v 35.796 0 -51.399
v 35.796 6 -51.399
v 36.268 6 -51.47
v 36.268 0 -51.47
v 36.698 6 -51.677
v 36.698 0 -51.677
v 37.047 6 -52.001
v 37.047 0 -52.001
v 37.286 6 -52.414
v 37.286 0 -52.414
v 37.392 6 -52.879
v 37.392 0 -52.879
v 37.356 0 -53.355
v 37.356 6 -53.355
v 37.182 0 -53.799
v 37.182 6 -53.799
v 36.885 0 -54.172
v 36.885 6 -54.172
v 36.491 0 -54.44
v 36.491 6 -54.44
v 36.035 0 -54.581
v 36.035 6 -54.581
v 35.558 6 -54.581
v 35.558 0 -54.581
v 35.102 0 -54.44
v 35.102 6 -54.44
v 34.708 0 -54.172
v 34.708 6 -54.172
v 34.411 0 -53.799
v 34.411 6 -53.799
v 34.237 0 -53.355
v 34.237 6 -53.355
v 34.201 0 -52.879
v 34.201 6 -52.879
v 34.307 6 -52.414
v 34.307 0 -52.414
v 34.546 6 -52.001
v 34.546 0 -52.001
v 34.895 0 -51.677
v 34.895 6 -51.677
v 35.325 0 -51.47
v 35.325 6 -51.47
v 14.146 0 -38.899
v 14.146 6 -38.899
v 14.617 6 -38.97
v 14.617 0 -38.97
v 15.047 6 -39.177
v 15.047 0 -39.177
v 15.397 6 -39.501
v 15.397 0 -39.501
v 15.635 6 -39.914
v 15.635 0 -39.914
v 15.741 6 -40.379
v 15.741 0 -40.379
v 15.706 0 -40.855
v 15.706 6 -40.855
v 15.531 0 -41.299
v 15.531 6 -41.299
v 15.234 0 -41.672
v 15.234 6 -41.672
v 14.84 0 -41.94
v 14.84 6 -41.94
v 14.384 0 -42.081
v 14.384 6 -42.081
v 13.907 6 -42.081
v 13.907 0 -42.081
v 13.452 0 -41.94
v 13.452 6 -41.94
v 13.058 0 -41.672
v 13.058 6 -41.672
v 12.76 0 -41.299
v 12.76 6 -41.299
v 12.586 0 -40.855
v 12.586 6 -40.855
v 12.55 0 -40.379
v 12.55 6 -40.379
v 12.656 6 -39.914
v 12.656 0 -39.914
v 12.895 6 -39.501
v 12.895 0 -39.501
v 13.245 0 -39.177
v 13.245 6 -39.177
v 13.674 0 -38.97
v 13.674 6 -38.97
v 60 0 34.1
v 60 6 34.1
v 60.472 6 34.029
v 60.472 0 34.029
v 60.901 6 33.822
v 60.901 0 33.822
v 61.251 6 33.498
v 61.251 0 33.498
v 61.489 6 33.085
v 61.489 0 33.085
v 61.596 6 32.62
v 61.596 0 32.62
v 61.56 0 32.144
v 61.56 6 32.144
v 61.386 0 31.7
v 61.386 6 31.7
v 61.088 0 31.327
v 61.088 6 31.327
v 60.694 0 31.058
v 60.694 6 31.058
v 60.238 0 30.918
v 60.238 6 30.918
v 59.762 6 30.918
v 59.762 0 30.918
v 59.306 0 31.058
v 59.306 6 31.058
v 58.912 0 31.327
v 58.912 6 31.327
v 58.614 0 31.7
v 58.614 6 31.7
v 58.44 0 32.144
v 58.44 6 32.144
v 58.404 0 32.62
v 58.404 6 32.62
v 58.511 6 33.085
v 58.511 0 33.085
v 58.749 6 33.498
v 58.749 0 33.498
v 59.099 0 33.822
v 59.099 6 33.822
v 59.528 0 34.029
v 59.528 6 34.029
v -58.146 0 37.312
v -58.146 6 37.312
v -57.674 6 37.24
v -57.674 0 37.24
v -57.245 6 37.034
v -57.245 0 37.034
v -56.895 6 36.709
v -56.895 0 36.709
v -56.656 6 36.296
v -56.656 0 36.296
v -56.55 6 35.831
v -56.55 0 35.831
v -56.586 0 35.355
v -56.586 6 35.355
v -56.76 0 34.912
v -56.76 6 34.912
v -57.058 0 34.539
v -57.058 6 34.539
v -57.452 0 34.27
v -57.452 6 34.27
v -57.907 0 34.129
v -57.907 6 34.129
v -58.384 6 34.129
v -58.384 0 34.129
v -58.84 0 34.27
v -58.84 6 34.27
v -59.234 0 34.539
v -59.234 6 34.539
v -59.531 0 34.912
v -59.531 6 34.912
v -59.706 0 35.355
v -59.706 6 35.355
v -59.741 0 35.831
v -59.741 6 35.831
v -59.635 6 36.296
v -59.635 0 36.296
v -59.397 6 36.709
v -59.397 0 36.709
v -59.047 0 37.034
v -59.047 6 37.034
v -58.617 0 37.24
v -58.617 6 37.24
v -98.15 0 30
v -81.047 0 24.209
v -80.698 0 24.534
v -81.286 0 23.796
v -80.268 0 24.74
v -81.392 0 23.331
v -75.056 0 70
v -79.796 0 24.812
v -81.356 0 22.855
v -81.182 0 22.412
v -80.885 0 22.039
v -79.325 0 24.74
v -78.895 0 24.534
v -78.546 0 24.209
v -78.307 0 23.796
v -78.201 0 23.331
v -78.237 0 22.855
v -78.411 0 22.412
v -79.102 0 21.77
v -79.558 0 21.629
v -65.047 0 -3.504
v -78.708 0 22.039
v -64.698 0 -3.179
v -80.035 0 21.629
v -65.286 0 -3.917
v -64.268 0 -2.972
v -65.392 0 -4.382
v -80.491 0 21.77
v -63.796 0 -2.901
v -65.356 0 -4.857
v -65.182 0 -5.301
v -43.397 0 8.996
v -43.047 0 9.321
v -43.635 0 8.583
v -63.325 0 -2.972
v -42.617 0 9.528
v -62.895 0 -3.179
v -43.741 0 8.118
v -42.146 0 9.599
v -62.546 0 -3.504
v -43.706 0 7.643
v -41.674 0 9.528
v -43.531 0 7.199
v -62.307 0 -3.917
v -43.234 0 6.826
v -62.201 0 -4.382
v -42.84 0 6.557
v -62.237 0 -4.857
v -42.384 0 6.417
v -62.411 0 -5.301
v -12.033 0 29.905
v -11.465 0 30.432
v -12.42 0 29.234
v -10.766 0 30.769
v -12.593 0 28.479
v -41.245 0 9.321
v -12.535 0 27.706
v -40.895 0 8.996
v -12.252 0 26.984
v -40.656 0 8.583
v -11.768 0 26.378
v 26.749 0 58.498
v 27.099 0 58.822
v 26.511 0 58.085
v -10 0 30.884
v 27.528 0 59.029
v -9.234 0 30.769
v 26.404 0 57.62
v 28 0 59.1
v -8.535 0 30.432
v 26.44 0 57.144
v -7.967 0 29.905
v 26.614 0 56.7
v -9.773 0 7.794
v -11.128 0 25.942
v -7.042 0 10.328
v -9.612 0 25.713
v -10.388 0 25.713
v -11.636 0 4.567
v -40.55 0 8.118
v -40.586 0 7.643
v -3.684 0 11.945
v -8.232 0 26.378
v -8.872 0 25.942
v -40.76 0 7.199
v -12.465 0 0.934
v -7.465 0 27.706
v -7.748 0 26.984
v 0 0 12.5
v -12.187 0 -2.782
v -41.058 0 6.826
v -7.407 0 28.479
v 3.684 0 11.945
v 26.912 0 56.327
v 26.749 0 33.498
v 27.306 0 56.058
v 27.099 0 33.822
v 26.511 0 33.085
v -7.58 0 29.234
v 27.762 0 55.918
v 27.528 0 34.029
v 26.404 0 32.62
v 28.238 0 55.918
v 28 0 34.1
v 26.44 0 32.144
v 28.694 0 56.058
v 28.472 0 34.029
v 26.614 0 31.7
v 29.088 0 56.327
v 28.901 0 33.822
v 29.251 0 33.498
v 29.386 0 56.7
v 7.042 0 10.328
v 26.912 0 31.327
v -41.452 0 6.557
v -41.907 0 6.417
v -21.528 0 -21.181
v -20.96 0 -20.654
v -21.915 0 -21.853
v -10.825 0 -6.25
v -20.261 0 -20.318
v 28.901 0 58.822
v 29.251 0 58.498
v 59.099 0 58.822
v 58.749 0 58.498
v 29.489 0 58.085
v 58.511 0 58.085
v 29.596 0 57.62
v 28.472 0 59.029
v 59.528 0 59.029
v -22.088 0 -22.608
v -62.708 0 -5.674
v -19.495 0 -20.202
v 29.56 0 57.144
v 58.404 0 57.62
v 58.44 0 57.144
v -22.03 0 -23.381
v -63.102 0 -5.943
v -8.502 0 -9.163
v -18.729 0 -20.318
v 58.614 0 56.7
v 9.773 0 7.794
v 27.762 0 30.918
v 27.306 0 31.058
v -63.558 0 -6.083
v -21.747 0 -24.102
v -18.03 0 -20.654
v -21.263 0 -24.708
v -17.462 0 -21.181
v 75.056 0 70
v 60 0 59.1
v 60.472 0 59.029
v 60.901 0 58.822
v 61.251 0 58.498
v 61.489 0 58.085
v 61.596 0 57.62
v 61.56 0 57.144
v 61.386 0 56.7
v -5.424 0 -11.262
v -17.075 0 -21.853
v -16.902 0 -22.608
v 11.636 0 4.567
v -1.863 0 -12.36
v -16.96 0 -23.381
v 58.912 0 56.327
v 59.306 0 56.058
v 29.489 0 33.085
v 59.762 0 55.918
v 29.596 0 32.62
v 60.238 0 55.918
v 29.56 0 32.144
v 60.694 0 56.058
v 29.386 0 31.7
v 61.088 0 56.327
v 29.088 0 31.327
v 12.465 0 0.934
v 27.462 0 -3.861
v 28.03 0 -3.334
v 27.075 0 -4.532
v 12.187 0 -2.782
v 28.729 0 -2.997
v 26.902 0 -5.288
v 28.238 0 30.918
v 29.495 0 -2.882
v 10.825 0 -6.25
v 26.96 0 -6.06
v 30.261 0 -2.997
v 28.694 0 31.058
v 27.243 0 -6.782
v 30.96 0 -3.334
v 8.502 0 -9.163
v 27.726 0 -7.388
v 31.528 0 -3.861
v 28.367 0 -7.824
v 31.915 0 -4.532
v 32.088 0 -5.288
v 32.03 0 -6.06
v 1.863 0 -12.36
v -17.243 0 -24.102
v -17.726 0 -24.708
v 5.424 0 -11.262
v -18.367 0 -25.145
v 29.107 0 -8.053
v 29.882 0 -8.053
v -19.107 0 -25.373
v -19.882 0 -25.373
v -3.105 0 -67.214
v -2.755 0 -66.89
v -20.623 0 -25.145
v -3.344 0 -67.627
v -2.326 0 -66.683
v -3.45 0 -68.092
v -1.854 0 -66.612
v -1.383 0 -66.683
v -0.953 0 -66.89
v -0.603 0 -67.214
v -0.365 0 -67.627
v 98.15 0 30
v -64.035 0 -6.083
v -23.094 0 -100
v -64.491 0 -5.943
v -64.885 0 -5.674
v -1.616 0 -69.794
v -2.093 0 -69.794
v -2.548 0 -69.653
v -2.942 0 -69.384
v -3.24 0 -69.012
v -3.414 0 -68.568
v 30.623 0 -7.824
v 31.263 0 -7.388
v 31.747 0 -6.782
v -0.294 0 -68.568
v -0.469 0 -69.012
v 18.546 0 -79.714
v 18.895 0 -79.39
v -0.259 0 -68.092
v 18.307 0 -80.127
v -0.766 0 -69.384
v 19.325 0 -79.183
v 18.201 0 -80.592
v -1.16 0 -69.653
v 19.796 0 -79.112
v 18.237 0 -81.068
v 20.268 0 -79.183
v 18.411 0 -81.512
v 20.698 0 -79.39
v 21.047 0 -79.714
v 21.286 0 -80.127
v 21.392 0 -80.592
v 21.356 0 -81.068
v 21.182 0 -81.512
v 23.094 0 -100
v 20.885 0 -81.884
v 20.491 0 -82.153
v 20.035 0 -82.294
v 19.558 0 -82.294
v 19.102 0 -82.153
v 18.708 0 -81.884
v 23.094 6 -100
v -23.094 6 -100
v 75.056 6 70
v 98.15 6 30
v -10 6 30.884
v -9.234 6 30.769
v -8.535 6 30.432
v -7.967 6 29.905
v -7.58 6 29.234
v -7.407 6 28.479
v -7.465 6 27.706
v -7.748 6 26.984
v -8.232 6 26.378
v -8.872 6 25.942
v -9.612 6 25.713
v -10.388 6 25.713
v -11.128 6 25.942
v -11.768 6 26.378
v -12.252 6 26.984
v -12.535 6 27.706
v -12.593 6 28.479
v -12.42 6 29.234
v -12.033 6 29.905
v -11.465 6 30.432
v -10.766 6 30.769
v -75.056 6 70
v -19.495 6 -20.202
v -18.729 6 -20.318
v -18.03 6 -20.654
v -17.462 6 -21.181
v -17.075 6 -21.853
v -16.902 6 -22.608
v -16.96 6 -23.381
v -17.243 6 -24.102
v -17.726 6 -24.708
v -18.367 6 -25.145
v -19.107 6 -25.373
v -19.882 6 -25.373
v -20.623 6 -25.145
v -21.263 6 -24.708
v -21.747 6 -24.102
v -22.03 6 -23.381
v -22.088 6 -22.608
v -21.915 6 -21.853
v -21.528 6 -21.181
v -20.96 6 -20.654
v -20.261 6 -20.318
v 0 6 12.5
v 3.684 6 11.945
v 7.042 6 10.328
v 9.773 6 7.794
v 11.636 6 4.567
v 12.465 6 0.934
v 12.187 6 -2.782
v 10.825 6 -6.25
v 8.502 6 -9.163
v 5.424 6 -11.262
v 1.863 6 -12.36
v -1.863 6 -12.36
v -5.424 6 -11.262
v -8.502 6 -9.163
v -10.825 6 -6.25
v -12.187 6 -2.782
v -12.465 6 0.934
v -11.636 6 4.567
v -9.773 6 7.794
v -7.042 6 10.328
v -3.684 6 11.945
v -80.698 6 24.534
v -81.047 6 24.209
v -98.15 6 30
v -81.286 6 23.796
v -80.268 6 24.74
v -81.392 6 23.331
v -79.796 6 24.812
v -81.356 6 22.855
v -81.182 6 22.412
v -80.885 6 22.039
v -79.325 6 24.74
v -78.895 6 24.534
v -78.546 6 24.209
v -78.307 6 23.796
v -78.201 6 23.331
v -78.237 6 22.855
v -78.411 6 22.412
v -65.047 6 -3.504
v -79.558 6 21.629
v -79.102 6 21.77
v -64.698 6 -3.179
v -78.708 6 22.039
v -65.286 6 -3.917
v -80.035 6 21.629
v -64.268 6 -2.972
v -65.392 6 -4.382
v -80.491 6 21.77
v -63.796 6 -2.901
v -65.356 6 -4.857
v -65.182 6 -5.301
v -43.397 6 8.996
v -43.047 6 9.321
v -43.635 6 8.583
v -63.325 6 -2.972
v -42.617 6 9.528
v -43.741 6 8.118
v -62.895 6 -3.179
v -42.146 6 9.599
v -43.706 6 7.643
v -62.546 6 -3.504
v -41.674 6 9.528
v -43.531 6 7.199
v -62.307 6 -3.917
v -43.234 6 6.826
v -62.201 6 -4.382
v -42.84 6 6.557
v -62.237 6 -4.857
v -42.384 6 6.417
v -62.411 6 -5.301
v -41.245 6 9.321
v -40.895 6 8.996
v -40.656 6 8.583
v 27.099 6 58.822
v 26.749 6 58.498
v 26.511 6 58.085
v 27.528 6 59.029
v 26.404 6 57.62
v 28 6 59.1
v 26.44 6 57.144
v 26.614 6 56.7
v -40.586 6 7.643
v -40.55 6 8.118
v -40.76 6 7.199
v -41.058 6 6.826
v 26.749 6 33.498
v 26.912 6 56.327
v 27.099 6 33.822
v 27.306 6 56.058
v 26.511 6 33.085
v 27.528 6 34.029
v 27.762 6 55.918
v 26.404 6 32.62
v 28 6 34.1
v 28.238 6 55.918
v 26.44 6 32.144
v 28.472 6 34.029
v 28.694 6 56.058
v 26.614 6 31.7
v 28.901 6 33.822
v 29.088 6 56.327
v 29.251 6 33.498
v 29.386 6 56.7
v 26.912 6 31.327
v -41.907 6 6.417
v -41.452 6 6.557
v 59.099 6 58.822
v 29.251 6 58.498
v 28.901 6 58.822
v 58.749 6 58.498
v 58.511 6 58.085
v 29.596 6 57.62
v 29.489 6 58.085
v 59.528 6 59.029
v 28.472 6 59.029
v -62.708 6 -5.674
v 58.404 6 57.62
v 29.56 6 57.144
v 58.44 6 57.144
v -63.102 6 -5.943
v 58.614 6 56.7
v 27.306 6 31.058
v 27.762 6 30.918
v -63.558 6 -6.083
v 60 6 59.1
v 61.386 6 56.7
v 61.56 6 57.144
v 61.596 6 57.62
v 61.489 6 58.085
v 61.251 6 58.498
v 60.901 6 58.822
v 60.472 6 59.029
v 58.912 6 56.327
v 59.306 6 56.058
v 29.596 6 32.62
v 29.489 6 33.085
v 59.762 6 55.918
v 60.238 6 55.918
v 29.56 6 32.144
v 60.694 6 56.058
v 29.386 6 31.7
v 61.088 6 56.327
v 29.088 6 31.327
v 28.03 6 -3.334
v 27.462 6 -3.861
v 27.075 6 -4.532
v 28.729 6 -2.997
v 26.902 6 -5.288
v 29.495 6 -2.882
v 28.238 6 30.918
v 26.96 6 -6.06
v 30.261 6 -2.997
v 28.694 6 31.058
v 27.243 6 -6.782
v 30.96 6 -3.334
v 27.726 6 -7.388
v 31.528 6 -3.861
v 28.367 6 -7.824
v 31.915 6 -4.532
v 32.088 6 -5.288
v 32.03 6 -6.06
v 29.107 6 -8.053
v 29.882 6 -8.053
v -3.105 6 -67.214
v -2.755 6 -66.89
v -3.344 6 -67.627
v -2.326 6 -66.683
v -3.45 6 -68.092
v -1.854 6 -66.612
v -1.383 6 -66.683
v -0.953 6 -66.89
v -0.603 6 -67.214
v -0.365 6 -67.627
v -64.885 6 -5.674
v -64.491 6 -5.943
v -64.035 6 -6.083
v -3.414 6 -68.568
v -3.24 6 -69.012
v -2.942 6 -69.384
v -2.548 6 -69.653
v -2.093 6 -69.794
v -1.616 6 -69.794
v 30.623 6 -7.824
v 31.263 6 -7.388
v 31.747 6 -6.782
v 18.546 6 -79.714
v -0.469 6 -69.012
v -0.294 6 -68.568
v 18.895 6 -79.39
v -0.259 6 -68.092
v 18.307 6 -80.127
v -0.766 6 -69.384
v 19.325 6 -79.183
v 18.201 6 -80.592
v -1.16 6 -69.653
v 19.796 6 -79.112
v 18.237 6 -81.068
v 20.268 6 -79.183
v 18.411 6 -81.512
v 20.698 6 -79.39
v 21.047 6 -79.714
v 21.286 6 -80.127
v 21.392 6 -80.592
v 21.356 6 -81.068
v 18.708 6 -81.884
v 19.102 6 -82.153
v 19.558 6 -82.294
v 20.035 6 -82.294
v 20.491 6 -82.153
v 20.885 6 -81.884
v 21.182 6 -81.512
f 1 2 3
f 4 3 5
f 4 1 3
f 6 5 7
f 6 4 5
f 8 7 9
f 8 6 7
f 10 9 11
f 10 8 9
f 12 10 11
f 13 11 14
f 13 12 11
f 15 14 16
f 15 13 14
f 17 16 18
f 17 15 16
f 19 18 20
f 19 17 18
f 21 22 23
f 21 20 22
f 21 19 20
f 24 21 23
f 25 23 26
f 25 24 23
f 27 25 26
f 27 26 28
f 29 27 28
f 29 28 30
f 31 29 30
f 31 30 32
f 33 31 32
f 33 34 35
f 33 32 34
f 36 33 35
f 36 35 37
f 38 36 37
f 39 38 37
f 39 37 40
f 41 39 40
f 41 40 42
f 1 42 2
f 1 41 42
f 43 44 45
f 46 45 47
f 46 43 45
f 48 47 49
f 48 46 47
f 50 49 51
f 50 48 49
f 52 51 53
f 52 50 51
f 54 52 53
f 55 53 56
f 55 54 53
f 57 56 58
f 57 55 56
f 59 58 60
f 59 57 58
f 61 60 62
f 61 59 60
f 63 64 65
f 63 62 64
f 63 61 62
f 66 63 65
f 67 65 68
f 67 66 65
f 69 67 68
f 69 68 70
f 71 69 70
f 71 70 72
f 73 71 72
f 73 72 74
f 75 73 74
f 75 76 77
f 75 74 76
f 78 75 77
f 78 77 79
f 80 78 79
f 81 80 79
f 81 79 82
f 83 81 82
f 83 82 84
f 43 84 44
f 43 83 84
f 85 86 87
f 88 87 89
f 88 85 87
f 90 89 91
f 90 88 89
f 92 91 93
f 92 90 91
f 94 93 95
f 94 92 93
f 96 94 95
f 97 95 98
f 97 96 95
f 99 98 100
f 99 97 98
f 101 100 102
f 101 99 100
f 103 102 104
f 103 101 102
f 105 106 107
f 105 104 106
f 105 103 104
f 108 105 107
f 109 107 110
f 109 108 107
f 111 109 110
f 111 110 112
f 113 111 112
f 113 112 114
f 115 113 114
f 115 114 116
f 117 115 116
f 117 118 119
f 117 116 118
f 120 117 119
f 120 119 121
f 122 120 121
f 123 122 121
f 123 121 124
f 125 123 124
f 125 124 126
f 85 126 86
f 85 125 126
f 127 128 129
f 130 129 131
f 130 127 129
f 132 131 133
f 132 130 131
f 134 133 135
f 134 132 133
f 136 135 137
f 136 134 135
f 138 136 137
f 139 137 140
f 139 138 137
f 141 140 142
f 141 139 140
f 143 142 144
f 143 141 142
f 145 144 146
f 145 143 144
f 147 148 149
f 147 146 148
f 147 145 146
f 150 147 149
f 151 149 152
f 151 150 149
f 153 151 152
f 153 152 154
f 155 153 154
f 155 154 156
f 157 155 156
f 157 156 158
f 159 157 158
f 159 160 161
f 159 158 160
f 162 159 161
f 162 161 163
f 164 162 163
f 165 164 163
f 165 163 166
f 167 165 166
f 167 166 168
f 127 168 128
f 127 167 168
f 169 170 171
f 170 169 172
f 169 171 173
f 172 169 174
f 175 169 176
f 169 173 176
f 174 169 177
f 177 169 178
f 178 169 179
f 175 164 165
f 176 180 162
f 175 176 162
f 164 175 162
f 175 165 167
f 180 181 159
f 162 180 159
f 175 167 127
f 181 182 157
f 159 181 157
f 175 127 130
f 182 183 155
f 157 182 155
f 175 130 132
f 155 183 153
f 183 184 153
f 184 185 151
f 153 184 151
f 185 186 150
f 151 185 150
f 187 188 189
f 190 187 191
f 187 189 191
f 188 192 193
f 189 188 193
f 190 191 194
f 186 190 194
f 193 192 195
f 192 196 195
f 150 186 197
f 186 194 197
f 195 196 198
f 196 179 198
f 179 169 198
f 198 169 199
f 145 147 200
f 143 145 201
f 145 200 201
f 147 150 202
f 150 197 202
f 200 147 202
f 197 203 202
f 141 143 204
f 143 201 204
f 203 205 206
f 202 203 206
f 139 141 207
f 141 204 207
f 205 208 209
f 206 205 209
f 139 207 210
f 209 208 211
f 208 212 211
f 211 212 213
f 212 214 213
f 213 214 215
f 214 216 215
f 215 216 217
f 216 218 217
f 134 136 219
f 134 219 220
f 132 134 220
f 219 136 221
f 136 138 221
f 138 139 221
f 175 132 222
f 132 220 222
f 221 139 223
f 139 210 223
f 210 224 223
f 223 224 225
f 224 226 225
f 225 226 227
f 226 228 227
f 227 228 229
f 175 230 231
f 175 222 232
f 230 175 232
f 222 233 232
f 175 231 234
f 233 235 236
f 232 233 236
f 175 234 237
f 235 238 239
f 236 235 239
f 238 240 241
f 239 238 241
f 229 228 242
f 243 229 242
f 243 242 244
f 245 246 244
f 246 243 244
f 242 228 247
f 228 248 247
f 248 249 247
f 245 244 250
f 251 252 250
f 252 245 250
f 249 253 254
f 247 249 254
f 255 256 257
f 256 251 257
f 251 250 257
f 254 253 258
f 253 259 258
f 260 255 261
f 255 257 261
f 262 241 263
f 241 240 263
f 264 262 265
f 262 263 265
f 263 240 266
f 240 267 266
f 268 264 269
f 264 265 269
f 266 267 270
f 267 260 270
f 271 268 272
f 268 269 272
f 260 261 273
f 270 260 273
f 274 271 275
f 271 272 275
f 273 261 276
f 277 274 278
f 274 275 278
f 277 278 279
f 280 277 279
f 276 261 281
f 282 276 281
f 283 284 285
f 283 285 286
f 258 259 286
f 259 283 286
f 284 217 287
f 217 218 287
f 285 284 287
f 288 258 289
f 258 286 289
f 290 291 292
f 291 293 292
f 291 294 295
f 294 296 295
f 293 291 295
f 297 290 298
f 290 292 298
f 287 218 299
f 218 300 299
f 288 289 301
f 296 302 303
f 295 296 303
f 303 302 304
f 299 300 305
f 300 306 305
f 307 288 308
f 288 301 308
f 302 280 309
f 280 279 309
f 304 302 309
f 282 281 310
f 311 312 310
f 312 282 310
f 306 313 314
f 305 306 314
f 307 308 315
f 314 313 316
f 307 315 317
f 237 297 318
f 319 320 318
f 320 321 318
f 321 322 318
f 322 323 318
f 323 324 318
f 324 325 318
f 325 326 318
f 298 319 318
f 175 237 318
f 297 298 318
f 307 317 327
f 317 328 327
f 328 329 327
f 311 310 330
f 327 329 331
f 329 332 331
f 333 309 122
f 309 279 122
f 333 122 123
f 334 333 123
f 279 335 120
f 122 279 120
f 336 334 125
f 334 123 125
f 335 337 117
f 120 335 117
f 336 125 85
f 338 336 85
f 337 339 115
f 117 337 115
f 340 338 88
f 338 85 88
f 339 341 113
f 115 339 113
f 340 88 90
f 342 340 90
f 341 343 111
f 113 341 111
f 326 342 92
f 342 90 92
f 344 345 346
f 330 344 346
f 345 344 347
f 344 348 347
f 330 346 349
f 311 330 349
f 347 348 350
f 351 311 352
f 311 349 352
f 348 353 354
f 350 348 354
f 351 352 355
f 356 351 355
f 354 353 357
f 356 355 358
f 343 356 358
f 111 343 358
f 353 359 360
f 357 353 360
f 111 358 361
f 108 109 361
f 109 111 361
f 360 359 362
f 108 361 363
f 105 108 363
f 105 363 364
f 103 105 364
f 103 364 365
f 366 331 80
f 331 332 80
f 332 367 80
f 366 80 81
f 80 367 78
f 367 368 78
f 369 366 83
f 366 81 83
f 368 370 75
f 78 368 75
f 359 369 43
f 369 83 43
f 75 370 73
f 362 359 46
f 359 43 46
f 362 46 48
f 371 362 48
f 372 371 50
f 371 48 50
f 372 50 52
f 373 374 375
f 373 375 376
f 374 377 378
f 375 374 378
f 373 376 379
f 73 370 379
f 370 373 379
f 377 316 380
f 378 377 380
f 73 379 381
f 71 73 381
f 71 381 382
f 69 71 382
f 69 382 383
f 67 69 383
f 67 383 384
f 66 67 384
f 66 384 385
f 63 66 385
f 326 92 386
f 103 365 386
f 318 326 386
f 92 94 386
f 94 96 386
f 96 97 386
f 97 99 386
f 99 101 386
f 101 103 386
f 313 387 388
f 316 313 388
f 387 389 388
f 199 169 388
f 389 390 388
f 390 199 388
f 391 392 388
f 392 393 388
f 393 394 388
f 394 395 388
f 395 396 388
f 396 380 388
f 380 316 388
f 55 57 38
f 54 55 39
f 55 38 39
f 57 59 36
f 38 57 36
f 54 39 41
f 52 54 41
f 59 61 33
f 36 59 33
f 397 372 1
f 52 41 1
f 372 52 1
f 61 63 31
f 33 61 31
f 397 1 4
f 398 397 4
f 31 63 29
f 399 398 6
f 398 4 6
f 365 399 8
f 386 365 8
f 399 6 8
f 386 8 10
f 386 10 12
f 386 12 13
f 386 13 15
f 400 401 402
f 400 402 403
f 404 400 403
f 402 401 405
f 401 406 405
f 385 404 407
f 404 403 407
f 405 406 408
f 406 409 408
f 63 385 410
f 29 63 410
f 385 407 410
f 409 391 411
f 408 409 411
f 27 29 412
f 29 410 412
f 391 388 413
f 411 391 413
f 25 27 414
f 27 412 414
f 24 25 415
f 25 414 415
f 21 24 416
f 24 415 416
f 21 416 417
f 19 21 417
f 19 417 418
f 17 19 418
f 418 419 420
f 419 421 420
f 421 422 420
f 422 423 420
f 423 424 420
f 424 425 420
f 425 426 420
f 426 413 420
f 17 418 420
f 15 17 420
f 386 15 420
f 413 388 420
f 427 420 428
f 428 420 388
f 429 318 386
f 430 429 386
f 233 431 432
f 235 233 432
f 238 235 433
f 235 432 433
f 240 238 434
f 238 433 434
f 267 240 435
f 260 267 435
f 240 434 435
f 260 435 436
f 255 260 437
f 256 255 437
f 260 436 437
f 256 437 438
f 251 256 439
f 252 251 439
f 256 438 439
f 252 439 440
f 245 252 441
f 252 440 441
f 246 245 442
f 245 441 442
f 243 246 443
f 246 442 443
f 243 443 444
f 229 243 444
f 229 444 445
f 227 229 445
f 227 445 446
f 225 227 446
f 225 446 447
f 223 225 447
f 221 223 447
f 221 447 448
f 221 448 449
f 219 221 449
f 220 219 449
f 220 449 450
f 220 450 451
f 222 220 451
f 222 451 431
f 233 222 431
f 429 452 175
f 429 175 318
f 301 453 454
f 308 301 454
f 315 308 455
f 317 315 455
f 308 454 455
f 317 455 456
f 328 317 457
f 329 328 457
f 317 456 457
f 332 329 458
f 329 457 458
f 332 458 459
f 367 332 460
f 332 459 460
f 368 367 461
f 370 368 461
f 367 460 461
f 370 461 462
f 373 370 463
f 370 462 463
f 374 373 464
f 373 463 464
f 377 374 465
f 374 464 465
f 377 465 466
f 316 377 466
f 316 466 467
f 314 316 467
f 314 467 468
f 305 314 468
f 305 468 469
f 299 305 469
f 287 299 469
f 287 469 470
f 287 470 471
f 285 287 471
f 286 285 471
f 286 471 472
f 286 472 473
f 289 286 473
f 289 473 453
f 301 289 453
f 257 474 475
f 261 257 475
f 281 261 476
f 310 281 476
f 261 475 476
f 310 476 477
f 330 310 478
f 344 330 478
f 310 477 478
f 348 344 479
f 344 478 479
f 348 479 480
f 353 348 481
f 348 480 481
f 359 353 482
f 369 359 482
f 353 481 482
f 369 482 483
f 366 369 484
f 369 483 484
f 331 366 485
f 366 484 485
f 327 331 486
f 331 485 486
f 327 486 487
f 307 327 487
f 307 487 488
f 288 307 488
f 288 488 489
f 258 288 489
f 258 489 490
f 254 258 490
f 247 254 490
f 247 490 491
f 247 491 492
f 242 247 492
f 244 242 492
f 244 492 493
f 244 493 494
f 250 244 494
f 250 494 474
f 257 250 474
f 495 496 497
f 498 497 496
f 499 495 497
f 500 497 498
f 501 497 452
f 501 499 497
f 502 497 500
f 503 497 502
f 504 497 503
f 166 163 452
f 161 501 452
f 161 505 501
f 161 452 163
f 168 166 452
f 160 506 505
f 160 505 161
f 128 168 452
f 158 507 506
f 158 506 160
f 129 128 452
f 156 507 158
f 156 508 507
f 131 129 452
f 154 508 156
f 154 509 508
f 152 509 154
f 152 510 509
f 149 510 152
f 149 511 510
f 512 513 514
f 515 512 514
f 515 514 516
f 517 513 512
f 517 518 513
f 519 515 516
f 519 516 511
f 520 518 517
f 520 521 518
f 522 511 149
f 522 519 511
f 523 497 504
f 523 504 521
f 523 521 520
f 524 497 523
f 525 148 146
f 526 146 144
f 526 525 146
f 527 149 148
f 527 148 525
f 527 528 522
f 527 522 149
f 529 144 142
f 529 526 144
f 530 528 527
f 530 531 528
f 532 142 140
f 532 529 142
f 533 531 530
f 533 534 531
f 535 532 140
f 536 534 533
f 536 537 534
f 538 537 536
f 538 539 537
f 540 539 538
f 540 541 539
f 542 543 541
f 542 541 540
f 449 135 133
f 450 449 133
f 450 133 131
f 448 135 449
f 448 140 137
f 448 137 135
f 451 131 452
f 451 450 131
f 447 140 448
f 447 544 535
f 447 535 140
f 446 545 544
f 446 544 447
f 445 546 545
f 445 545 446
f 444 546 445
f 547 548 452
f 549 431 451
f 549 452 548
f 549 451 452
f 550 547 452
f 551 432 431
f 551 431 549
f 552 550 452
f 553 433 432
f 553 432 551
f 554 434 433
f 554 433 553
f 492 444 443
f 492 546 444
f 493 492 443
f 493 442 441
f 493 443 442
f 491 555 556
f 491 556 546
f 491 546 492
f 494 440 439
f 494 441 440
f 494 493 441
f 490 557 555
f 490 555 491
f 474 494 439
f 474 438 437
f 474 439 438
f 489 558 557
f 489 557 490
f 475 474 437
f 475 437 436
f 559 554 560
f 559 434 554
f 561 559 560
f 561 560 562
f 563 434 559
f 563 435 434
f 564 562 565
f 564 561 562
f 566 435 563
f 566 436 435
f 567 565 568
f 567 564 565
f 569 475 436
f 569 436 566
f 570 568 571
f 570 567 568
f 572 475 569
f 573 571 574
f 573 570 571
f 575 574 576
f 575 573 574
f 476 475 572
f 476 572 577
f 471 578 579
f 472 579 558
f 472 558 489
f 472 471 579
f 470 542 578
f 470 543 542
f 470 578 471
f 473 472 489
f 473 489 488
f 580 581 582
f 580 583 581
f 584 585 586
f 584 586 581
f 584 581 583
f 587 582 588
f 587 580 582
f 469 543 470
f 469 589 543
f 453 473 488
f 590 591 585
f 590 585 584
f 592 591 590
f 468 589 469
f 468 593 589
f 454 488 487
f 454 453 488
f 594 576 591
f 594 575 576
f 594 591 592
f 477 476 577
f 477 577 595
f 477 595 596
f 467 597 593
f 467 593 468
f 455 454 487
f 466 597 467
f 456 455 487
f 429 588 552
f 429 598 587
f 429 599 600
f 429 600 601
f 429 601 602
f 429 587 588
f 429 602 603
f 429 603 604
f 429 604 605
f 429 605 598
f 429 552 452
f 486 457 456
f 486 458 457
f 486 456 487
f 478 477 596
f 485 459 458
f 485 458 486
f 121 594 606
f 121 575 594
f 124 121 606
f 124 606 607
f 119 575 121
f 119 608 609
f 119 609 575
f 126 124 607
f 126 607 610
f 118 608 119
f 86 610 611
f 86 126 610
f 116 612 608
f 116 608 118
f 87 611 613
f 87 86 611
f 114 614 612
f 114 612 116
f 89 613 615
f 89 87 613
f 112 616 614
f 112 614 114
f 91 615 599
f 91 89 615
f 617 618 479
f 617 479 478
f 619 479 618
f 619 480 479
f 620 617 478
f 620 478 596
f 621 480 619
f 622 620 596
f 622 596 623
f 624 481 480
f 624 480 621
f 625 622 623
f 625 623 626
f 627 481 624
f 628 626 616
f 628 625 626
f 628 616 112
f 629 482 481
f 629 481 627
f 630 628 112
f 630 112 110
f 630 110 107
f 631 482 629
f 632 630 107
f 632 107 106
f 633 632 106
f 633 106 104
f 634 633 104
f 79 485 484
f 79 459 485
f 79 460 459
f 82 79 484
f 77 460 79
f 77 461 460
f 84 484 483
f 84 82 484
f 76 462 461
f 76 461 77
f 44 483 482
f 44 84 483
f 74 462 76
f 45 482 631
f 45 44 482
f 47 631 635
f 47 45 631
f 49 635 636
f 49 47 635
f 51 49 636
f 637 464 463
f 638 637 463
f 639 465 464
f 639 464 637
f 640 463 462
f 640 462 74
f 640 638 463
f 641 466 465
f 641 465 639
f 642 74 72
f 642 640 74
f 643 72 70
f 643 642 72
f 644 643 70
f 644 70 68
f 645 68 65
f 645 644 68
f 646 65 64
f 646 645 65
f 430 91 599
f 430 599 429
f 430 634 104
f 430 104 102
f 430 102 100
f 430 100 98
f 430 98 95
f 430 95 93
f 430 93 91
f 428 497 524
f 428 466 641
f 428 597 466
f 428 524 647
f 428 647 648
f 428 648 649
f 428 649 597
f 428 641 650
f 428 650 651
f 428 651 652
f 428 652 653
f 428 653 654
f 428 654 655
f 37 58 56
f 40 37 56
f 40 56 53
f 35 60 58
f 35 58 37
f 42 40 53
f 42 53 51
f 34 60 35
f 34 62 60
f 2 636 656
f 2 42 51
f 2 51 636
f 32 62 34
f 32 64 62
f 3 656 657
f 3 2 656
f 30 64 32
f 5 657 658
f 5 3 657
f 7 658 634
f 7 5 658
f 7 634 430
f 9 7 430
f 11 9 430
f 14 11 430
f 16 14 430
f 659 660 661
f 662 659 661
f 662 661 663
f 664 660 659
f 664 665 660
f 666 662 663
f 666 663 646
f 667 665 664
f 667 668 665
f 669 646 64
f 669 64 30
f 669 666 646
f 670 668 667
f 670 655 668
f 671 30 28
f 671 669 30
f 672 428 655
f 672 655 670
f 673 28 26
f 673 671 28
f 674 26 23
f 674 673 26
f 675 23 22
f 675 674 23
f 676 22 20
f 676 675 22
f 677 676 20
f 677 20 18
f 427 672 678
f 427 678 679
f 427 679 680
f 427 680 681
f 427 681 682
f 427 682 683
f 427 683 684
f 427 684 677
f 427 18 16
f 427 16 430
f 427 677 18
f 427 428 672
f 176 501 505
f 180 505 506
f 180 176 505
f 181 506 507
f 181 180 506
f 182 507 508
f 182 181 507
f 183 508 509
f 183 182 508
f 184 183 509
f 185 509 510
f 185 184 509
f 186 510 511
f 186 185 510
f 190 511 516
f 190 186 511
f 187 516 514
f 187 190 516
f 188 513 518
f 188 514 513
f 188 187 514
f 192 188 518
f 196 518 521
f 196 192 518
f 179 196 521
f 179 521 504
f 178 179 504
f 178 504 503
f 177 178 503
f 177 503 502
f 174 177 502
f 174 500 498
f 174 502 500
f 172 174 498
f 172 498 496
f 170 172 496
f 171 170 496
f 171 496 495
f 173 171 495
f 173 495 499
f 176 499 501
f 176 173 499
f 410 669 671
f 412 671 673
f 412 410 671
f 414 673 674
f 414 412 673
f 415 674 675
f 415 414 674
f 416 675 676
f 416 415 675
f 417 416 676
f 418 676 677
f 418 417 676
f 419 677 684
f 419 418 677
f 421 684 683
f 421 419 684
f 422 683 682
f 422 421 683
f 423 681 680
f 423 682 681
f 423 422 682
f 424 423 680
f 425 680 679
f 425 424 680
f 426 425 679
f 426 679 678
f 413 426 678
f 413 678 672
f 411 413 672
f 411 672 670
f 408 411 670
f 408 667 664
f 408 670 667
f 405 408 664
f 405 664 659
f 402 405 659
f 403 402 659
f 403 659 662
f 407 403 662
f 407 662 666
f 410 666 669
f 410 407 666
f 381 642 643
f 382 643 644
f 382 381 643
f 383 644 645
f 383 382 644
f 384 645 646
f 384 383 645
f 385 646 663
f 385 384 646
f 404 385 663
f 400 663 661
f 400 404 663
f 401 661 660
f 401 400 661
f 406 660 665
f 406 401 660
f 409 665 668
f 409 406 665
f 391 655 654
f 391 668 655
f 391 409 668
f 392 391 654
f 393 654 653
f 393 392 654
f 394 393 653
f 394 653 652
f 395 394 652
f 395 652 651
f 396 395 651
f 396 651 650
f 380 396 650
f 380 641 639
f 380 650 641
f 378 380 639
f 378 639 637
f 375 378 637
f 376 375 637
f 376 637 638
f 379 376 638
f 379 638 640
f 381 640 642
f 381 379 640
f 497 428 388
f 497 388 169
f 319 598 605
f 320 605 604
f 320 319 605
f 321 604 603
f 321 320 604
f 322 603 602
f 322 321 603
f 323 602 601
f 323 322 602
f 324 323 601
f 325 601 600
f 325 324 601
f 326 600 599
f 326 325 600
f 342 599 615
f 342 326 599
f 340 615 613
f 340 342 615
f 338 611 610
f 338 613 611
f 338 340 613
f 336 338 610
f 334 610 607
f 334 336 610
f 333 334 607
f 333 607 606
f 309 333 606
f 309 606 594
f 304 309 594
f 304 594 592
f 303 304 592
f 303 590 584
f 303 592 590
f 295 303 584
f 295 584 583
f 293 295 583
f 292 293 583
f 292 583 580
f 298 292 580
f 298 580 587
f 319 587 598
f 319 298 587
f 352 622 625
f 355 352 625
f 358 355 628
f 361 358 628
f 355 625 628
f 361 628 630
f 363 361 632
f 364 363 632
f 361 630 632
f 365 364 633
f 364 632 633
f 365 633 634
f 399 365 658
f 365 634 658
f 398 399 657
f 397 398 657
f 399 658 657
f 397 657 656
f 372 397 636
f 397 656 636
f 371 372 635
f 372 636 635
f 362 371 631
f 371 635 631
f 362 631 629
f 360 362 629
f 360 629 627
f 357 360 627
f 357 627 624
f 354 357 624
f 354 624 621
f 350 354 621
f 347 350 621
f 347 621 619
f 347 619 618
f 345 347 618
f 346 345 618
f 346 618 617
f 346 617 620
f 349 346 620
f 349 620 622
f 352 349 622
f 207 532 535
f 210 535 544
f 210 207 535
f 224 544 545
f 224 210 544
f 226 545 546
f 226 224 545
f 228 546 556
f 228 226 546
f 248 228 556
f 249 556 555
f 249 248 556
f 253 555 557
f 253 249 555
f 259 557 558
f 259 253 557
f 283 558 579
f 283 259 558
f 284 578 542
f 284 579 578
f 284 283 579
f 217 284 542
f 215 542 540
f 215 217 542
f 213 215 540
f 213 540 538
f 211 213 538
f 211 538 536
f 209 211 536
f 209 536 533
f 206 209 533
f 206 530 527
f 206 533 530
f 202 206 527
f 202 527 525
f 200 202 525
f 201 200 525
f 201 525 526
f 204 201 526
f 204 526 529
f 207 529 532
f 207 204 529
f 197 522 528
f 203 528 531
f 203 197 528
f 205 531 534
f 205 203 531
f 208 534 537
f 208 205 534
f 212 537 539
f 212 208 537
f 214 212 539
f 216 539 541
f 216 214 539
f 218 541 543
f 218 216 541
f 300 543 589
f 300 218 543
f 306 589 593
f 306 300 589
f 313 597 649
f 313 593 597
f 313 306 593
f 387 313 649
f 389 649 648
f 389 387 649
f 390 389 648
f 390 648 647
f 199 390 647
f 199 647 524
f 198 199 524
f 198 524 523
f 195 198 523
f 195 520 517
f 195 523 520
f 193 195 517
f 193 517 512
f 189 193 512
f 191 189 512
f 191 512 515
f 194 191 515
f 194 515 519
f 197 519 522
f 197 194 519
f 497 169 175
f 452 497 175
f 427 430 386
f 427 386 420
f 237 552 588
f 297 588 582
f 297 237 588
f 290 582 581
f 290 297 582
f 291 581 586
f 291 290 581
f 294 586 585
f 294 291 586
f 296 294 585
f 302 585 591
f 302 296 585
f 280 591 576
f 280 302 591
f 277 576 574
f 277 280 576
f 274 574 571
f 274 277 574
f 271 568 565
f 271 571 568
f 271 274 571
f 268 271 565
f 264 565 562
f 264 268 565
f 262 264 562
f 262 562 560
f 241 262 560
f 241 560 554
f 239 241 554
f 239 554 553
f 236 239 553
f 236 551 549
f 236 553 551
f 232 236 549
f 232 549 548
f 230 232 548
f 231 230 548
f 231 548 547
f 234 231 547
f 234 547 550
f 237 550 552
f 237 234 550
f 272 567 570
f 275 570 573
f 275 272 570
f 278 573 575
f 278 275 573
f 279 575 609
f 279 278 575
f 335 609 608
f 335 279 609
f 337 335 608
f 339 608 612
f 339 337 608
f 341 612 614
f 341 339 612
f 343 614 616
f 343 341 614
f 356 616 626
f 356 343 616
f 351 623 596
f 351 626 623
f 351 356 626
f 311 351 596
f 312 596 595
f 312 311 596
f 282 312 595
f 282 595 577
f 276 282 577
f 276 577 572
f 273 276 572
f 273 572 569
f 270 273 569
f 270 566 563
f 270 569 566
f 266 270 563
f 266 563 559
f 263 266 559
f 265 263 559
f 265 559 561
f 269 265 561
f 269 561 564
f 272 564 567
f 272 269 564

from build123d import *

# Parameters (mm, degrees)
EXTRUDE_1_DEPTH     = 6
SKETCH_2_R          = 12.5
CUT_EXTRUDE_1_DEPTH = 153.870315409
CUT_EXTRUDE_2_DEPTH = 153.870315409
SKETCH_6_R          = 2.6
CUT_EXTRUDE_5_DEPTH = 141.247400451
SKETCH_7_R          = 1.6
CUT_EXTRUDE_8_DEPTH = 141.247400451


with BuildPart() as part:
    # 草图1 → 凸台-拉伸1 (new body)
    with BuildSketch(Plane(origin=(0, 0, 0), x_dir=(1, 0, 0), z_dir=(0, 1, 0))):
        Polygon((115.470053838, 0), (57.735026919, 100), (-57.735026919, 100), (-115.470053838, 0), (-57.735026919, -100), (57.735026919, -100), align=None)
    extrude(amount=EXTRUDE_1_DEPTH)

    # 草图2 → 切除-拉伸1 (cut, through all)
    with BuildSketch(Plane(origin=(0, 6, 0), x_dir=(1, 0, 0), z_dir=(0, 1, 0))):
        with Locations(Location((0, 0, 0), (0, 0, 270))):
            Circle(SKETCH_2_R)
    extrude(amount=-CUT_EXTRUDE_1_DEPTH, mode=Mode.SUBTRACT)

    # 草图3 → 切除-拉伸2 (cut, through all)
    with BuildSketch(Plane(origin=(0, 6, 0), x_dir=(1, 0, 0), z_dir=(0, 1, 0))):
        Polygon((-23.094010768, 100), (-98.149545762, -30), (-115.470053838, 0), (-57.735026919, 100), align=None)
        Polygon((98.149545762, -30), (23.094010768, 100), (57.735026919, 100), (115.470053838, 0), align=None)
        Polygon((-75.055534995, -70), (75.055534995, -70), (57.735026919, -100), (-57.735026919, -100), align=None)
    extrude(amount=-CUT_EXTRUDE_2_DEPTH, mode=Mode.SUBTRACT)

    # 草图6 → 切除-拉伸5 (cut, through all)
    with BuildSketch(Plane(origin=(0, 6, 0), x_dir=(1, 0, 0), z_dir=(0, 1, 0))):
        with Locations(Location((-10, -28.284271247, 0), (0, 0, 270))):
            Circle(SKETCH_6_R)
        with Locations(Location((-19.494897428, 22.802389662, 0), (0, 0, 270))):
            Circle(SKETCH_6_R)
        with Locations(Location((29.494897428, 5.481881586, 0), (0, 0, 270))):
            Circle(SKETCH_6_R)
    extrude(amount=-CUT_EXTRUDE_5_DEPTH, mode=Mode.SUBTRACT)

    # 草图7 → 切除-拉伸8 (cut, through all)
    with BuildSketch(Plane(origin=(0, 0, 0), x_dir=(1, 0, 0), z_dir=(0, 1, 0))):
        with Locations(Location((60, -32.5, 0), (0, 0, 270))):
            Circle(SKETCH_7_R)
        with Locations(Location((28, -32.5, 0), (0, 0, 270))):
            Circle(SKETCH_7_R)
        with Locations(Location((60, -57.5, 0), (0, 0, 270))):
            Circle(SKETCH_7_R)
        with Locations(Location((28, -57.5, 0), (0, 0, 270))):
            Circle(SKETCH_7_R)
        with Locations(Location((-58.145825623, -35.711524227, 0), (0, 0, 270))):
            Circle(SKETCH_7_R)
        with Locations(Location((-42.145825623, -7.998711306, 0), (0, 0, 270))):
            Circle(SKETCH_7_R)
        with Locations(Location((-79.796460718, -23.211524227, 0), (0, 0, 270))):
            Circle(SKETCH_7_R)
        with Locations(Location((-63.796460718, 4.501288694, 0), (0, 0, 270))):
            Circle(SKETCH_7_R)
        with Locations(Location((-1.854174377, 68.211524227, 0), (0, 0, 270))):
            Circle(SKETCH_7_R)
        with Locations(Location((14.145825623, 40.498711306, 0), (0, 0, 270))):
            Circle(SKETCH_7_R)
        with Locations(Location((19.796460718, 80.711524227, 0), (0, 0, 270))):
            Circle(SKETCH_7_R)
        with Locations(Location((35.796460718, 52.998711306, 0), (0, 0, 270))):
            Circle(SKETCH_7_R)
    extrude(amount=CUT_EXTRUDE_8_DEPTH, mode=Mode.SUBTRACT)


solid = part.part
